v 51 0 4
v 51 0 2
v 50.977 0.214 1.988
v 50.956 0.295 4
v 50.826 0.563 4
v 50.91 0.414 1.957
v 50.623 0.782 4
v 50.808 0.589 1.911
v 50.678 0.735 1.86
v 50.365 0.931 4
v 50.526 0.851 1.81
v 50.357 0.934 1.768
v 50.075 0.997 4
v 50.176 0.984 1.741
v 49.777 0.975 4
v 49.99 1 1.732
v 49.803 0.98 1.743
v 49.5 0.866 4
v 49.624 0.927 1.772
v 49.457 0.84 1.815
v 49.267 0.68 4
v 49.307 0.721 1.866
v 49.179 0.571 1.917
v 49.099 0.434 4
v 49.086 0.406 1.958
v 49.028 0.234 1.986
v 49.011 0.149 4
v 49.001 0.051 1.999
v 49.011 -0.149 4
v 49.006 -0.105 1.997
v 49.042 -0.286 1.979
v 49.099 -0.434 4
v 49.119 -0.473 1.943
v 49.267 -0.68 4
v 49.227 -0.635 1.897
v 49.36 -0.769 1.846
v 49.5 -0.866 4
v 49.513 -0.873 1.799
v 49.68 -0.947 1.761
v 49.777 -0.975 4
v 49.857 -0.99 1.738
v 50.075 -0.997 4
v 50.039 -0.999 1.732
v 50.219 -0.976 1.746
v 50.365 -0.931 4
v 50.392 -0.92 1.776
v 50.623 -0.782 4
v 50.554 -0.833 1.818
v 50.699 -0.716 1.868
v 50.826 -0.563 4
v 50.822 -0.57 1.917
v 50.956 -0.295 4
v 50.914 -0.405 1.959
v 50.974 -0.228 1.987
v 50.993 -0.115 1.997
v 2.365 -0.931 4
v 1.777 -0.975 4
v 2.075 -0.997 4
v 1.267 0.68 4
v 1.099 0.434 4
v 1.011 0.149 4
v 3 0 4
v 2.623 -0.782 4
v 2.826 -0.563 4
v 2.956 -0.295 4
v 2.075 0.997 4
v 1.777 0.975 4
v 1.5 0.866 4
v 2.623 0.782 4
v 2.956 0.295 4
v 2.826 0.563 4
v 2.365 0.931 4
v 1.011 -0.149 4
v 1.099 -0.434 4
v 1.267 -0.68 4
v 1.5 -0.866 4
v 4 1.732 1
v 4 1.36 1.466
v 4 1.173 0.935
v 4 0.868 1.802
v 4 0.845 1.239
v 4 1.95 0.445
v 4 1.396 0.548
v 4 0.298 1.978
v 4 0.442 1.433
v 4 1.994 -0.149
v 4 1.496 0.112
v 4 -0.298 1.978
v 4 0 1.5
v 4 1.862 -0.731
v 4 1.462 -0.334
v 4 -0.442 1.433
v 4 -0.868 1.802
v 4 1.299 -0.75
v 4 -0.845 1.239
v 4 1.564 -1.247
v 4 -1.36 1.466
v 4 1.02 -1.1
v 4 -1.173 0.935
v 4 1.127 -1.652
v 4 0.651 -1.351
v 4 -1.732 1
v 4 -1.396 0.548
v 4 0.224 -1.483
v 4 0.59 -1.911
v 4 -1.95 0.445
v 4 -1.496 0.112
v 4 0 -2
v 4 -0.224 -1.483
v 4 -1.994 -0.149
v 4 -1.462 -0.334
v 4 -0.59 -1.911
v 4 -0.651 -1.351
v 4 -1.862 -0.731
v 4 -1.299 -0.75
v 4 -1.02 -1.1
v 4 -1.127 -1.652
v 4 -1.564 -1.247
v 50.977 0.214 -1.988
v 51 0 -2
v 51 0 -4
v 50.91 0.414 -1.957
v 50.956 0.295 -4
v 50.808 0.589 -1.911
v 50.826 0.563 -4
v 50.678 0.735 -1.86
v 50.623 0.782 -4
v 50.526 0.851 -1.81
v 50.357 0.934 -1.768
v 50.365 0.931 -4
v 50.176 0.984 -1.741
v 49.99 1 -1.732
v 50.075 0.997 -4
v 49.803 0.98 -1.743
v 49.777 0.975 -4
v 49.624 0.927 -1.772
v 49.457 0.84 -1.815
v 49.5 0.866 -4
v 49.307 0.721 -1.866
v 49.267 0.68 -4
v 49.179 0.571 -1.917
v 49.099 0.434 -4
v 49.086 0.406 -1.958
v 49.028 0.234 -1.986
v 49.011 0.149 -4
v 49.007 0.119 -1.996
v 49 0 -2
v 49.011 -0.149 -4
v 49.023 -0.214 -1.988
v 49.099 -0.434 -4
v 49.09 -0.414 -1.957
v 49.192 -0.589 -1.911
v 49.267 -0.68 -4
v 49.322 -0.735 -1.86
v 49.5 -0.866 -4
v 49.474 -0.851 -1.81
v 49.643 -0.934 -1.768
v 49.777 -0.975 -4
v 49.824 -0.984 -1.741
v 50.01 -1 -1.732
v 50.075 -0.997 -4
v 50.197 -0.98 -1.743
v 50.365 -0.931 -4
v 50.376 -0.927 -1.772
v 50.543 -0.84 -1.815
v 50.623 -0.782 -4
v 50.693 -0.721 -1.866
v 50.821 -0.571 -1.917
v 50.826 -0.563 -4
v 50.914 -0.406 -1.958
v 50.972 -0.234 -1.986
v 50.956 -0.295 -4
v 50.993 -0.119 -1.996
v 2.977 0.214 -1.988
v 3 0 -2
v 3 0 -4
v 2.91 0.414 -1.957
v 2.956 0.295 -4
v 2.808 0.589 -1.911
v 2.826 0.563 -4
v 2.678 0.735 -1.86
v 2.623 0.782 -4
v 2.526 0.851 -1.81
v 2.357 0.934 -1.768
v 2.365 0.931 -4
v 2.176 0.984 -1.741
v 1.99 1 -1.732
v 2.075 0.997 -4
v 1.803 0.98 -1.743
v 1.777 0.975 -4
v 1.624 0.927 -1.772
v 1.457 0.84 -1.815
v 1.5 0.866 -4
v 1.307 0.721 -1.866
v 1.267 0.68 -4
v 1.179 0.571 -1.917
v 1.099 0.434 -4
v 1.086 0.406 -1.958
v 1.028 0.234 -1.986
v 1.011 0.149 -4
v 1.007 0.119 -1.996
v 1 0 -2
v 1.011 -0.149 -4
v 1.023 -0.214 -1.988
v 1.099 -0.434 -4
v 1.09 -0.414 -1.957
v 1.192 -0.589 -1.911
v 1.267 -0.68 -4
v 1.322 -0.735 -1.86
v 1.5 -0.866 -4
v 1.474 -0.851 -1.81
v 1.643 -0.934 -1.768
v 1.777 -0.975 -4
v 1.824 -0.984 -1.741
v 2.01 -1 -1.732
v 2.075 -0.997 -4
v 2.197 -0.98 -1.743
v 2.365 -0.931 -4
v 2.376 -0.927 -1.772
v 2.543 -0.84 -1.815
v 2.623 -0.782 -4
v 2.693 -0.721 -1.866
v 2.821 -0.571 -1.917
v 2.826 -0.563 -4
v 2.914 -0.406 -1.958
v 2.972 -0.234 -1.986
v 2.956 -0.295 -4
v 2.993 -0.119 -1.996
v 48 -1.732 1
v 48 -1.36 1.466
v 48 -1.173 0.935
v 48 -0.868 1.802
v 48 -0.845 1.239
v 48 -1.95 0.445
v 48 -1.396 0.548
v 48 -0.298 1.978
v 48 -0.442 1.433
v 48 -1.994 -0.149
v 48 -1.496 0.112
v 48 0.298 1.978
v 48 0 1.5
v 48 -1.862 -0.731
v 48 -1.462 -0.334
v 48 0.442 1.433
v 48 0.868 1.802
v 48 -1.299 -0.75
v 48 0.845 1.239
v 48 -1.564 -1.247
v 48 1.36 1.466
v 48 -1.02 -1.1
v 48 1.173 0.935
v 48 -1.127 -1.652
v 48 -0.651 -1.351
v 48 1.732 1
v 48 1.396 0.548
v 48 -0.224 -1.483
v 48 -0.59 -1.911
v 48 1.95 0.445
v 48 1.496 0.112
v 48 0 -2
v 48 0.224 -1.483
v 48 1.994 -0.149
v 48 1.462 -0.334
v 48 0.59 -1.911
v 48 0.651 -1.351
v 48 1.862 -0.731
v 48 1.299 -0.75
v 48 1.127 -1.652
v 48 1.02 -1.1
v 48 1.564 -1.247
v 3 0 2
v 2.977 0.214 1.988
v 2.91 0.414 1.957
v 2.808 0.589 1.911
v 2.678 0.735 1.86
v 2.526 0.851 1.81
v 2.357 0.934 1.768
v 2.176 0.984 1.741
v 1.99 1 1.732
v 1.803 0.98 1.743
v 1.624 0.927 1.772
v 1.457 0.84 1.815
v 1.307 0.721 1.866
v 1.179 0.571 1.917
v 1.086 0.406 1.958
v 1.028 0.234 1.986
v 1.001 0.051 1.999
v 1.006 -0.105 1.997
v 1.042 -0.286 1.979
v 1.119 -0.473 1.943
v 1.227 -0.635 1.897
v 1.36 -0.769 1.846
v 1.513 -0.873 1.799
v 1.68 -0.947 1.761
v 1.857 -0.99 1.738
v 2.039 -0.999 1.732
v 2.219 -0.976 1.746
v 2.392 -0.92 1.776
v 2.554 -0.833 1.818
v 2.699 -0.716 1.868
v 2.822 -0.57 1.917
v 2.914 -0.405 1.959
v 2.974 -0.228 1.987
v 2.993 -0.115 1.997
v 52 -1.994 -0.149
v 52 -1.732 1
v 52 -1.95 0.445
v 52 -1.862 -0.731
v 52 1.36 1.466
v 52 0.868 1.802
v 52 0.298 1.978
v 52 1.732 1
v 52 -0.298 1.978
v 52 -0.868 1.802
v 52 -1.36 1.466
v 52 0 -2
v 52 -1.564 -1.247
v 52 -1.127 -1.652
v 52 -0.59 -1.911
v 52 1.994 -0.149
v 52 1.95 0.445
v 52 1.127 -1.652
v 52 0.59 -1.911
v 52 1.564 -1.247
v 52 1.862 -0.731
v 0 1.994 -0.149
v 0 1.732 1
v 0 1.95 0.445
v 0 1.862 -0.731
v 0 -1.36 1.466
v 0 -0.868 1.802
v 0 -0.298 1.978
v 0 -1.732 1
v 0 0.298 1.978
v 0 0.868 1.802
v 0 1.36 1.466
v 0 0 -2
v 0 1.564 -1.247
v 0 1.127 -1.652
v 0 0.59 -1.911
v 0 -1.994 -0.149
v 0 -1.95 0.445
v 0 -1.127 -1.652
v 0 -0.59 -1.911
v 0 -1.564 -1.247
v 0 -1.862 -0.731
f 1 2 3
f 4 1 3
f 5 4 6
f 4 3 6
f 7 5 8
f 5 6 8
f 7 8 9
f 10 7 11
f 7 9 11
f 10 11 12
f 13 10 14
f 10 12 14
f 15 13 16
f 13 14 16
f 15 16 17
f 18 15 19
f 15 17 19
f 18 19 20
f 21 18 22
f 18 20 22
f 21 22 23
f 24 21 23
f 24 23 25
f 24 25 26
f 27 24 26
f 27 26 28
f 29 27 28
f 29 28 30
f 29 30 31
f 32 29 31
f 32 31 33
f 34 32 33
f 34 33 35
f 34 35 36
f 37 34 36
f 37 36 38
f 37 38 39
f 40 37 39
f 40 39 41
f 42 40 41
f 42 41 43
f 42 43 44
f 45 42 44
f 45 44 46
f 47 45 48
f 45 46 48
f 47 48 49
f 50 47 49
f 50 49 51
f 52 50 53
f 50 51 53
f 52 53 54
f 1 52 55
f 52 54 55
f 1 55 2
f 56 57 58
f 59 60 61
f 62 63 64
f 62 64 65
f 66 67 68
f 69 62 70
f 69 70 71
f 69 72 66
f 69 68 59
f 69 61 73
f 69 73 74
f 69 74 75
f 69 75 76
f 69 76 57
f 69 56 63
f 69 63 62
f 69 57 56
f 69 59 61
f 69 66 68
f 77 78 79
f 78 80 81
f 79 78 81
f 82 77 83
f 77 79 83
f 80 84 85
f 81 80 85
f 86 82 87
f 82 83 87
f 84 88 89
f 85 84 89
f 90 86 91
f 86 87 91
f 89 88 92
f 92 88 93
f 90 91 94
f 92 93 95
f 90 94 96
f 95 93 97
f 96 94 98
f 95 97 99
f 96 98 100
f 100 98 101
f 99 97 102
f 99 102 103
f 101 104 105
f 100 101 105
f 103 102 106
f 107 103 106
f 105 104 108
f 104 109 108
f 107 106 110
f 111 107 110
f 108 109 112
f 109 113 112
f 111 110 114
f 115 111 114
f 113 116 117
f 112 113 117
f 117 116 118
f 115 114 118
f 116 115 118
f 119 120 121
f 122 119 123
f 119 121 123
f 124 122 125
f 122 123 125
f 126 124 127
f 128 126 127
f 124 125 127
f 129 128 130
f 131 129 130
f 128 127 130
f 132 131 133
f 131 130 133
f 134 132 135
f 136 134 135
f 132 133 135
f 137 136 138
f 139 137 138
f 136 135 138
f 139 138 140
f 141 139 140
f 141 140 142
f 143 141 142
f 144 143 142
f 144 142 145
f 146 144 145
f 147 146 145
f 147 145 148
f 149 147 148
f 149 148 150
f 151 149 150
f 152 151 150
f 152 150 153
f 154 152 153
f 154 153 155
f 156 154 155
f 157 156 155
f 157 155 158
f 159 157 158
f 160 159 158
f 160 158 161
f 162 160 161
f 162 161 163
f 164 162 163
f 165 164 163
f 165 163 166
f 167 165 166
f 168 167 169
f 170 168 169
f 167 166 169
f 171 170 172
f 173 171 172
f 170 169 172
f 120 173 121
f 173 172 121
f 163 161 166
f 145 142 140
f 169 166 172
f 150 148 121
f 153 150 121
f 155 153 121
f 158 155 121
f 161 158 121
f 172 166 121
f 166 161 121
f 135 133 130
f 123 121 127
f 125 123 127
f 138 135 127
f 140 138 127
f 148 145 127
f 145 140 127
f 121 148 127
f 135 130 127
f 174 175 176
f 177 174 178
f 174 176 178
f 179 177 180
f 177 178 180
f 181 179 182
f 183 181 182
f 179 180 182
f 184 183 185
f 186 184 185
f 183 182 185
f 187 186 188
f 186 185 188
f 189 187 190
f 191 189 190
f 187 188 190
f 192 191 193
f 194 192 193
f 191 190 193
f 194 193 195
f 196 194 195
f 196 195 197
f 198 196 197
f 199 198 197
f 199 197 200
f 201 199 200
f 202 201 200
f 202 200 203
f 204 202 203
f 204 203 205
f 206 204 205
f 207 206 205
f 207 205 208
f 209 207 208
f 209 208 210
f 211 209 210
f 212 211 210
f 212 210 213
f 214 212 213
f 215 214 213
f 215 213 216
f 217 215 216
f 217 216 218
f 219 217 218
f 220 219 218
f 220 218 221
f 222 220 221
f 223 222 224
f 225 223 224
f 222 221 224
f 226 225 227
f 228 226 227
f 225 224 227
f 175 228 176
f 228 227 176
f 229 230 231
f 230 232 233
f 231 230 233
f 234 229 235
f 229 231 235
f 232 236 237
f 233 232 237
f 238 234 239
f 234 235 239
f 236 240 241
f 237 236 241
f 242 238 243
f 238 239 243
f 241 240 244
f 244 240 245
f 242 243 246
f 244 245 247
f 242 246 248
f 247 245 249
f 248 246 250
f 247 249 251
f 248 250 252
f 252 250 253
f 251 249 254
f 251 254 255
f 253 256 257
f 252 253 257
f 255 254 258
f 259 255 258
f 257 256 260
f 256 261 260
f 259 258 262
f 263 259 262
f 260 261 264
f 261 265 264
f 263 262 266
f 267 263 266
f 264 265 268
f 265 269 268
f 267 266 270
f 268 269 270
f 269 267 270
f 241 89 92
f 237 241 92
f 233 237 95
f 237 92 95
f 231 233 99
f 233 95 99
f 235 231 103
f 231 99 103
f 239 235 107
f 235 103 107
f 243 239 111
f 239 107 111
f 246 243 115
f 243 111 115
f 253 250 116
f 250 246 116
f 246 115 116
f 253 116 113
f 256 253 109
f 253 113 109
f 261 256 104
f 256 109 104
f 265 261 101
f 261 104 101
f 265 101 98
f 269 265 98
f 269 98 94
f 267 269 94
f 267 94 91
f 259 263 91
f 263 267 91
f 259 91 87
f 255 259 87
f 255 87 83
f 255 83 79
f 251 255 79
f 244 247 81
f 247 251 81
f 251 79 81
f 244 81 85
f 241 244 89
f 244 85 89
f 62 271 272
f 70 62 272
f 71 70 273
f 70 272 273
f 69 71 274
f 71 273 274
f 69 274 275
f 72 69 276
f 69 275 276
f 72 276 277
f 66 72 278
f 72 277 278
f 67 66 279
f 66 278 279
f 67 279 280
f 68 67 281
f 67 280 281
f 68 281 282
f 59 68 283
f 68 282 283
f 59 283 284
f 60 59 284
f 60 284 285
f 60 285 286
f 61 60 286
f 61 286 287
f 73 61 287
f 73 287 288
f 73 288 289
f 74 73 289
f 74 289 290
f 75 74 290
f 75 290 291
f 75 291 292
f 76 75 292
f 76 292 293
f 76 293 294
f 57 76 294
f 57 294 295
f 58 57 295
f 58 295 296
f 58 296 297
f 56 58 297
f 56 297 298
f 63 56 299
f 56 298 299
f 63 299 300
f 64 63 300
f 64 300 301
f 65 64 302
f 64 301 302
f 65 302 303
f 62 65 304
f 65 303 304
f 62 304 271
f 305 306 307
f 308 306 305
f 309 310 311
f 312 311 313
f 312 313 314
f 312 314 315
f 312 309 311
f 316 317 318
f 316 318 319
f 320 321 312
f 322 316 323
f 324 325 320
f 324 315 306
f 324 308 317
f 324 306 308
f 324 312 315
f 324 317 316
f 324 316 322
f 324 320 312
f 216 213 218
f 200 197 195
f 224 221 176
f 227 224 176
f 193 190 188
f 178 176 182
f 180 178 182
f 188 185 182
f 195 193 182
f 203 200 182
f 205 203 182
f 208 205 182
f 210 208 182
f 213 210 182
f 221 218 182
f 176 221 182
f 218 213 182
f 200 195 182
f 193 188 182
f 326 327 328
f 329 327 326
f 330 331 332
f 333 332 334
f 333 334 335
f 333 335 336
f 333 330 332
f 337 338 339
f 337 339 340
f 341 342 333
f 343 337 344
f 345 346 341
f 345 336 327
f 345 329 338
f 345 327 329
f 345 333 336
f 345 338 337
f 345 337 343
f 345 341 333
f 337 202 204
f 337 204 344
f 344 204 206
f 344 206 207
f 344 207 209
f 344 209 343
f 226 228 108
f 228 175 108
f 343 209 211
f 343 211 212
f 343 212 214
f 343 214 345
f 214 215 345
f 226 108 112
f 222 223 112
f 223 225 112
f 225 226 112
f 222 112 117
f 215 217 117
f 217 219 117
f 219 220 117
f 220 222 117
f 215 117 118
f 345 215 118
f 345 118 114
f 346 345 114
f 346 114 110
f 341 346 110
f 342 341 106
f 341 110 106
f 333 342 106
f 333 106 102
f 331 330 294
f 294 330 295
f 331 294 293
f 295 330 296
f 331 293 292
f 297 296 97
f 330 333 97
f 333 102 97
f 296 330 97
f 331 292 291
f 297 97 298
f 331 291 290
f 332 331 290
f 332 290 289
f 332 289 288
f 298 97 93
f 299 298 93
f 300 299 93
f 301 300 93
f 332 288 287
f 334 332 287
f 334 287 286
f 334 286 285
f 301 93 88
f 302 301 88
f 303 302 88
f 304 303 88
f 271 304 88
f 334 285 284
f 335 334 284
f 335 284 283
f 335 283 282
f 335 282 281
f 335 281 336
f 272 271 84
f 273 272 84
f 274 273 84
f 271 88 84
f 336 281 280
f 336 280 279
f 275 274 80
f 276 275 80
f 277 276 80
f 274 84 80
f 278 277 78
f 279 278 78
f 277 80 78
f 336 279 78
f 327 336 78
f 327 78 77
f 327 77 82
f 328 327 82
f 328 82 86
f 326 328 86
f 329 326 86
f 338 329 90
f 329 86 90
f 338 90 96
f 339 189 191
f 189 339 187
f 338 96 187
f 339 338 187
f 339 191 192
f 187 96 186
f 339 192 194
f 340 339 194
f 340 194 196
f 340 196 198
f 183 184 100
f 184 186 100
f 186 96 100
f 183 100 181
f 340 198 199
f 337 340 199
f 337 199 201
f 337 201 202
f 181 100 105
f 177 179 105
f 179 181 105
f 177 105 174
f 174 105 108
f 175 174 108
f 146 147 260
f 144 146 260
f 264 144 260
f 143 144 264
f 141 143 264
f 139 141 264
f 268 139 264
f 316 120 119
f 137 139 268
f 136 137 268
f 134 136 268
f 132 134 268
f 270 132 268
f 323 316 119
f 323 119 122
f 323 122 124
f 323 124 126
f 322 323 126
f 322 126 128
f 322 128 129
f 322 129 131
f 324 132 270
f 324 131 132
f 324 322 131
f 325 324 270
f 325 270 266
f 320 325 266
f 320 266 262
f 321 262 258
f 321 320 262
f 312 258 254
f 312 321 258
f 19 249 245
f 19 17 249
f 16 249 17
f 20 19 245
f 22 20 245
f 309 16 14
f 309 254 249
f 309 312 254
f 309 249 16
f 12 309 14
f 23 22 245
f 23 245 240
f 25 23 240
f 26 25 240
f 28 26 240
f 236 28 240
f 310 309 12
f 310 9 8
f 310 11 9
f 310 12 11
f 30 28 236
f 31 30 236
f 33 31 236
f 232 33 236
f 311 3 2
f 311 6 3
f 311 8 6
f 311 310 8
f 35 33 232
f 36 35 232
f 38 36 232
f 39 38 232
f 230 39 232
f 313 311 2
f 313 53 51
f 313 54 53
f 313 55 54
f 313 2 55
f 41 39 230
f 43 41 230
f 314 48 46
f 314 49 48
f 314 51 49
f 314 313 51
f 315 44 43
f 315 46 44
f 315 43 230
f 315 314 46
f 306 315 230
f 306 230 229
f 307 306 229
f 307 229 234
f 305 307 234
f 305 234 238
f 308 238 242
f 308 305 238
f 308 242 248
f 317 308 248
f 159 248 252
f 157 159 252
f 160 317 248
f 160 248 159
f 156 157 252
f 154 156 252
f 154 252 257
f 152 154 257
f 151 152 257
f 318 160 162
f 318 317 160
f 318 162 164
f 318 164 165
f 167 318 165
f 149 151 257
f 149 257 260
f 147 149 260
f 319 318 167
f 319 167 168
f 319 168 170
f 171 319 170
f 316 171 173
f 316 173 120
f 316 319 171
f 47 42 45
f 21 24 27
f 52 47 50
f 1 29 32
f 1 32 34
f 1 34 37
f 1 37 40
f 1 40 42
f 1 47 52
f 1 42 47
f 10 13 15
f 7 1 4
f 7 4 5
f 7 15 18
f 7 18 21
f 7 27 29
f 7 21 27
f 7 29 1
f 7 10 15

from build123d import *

# Parameters (mm, degrees)
SKETCH1_R                = 1.5
BOSS_EXTRUDE1_DEPTH      = 52
SKETCH2_R                = 2
BOSS_EXTRUDE2_DEPTH      = 4
BOSS_EXTRUDE3_START      = -4
SKETCH3_R                = 2
BOSS_EXTRUDE3_DEPTH      = 4
BOSS_EXTRUDE4_DEPTH      = 2
BOSS_EXTRUDE4_DEPTH_BACK = 6
SKETCH4_R                = 1


with BuildPart() as part:
    # Sketch1 → Boss-Extrude1 (new body)
    with BuildSketch(Plane(origin=(0, 0, 0), x_dir=(0, 0, -1), z_dir=(1, 0, 0))):
        with Locations(Location((0, 0, 0), (0, 0, 180))):
            Circle(SKETCH1_R)
    extrude(amount=BOSS_EXTRUDE1_DEPTH)

    # Sketch2 → Boss-Extrude2 (add)
    with BuildSketch(Plane(origin=(52, 0, 0), x_dir=(0, 0, -1), z_dir=(1, 0, 0))):
        Circle(SKETCH2_R)
    extrude(amount=-BOSS_EXTRUDE2_DEPTH)

    # Sketch3 → Boss-Extrude3 (add)
    with BuildSketch(Plane.ZY.offset(BOSS_EXTRUDE3_START)):
        with Locations(Location((0, 0, 0), (0, 0, 180))):
            Circle(SKETCH3_R)
    extrude(amount=BOSS_EXTRUDE3_DEPTH)

    # Sketch4 → Boss-Extrude4 (add, two sides: drawn at the far end of the back side and taken through both)
    with BuildSketch(Plane.XY.offset(2).offset(-BOSS_EXTRUDE4_DEPTH_BACK)):
        with Locations((50, 0)):
            Circle(SKETCH4_R)
        with Locations((2, 0)):
            Circle(SKETCH4_R)
    extrude(amount=BOSS_EXTRUDE4_DEPTH + BOSS_EXTRUDE4_DEPTH_BACK)


solid = part.part
